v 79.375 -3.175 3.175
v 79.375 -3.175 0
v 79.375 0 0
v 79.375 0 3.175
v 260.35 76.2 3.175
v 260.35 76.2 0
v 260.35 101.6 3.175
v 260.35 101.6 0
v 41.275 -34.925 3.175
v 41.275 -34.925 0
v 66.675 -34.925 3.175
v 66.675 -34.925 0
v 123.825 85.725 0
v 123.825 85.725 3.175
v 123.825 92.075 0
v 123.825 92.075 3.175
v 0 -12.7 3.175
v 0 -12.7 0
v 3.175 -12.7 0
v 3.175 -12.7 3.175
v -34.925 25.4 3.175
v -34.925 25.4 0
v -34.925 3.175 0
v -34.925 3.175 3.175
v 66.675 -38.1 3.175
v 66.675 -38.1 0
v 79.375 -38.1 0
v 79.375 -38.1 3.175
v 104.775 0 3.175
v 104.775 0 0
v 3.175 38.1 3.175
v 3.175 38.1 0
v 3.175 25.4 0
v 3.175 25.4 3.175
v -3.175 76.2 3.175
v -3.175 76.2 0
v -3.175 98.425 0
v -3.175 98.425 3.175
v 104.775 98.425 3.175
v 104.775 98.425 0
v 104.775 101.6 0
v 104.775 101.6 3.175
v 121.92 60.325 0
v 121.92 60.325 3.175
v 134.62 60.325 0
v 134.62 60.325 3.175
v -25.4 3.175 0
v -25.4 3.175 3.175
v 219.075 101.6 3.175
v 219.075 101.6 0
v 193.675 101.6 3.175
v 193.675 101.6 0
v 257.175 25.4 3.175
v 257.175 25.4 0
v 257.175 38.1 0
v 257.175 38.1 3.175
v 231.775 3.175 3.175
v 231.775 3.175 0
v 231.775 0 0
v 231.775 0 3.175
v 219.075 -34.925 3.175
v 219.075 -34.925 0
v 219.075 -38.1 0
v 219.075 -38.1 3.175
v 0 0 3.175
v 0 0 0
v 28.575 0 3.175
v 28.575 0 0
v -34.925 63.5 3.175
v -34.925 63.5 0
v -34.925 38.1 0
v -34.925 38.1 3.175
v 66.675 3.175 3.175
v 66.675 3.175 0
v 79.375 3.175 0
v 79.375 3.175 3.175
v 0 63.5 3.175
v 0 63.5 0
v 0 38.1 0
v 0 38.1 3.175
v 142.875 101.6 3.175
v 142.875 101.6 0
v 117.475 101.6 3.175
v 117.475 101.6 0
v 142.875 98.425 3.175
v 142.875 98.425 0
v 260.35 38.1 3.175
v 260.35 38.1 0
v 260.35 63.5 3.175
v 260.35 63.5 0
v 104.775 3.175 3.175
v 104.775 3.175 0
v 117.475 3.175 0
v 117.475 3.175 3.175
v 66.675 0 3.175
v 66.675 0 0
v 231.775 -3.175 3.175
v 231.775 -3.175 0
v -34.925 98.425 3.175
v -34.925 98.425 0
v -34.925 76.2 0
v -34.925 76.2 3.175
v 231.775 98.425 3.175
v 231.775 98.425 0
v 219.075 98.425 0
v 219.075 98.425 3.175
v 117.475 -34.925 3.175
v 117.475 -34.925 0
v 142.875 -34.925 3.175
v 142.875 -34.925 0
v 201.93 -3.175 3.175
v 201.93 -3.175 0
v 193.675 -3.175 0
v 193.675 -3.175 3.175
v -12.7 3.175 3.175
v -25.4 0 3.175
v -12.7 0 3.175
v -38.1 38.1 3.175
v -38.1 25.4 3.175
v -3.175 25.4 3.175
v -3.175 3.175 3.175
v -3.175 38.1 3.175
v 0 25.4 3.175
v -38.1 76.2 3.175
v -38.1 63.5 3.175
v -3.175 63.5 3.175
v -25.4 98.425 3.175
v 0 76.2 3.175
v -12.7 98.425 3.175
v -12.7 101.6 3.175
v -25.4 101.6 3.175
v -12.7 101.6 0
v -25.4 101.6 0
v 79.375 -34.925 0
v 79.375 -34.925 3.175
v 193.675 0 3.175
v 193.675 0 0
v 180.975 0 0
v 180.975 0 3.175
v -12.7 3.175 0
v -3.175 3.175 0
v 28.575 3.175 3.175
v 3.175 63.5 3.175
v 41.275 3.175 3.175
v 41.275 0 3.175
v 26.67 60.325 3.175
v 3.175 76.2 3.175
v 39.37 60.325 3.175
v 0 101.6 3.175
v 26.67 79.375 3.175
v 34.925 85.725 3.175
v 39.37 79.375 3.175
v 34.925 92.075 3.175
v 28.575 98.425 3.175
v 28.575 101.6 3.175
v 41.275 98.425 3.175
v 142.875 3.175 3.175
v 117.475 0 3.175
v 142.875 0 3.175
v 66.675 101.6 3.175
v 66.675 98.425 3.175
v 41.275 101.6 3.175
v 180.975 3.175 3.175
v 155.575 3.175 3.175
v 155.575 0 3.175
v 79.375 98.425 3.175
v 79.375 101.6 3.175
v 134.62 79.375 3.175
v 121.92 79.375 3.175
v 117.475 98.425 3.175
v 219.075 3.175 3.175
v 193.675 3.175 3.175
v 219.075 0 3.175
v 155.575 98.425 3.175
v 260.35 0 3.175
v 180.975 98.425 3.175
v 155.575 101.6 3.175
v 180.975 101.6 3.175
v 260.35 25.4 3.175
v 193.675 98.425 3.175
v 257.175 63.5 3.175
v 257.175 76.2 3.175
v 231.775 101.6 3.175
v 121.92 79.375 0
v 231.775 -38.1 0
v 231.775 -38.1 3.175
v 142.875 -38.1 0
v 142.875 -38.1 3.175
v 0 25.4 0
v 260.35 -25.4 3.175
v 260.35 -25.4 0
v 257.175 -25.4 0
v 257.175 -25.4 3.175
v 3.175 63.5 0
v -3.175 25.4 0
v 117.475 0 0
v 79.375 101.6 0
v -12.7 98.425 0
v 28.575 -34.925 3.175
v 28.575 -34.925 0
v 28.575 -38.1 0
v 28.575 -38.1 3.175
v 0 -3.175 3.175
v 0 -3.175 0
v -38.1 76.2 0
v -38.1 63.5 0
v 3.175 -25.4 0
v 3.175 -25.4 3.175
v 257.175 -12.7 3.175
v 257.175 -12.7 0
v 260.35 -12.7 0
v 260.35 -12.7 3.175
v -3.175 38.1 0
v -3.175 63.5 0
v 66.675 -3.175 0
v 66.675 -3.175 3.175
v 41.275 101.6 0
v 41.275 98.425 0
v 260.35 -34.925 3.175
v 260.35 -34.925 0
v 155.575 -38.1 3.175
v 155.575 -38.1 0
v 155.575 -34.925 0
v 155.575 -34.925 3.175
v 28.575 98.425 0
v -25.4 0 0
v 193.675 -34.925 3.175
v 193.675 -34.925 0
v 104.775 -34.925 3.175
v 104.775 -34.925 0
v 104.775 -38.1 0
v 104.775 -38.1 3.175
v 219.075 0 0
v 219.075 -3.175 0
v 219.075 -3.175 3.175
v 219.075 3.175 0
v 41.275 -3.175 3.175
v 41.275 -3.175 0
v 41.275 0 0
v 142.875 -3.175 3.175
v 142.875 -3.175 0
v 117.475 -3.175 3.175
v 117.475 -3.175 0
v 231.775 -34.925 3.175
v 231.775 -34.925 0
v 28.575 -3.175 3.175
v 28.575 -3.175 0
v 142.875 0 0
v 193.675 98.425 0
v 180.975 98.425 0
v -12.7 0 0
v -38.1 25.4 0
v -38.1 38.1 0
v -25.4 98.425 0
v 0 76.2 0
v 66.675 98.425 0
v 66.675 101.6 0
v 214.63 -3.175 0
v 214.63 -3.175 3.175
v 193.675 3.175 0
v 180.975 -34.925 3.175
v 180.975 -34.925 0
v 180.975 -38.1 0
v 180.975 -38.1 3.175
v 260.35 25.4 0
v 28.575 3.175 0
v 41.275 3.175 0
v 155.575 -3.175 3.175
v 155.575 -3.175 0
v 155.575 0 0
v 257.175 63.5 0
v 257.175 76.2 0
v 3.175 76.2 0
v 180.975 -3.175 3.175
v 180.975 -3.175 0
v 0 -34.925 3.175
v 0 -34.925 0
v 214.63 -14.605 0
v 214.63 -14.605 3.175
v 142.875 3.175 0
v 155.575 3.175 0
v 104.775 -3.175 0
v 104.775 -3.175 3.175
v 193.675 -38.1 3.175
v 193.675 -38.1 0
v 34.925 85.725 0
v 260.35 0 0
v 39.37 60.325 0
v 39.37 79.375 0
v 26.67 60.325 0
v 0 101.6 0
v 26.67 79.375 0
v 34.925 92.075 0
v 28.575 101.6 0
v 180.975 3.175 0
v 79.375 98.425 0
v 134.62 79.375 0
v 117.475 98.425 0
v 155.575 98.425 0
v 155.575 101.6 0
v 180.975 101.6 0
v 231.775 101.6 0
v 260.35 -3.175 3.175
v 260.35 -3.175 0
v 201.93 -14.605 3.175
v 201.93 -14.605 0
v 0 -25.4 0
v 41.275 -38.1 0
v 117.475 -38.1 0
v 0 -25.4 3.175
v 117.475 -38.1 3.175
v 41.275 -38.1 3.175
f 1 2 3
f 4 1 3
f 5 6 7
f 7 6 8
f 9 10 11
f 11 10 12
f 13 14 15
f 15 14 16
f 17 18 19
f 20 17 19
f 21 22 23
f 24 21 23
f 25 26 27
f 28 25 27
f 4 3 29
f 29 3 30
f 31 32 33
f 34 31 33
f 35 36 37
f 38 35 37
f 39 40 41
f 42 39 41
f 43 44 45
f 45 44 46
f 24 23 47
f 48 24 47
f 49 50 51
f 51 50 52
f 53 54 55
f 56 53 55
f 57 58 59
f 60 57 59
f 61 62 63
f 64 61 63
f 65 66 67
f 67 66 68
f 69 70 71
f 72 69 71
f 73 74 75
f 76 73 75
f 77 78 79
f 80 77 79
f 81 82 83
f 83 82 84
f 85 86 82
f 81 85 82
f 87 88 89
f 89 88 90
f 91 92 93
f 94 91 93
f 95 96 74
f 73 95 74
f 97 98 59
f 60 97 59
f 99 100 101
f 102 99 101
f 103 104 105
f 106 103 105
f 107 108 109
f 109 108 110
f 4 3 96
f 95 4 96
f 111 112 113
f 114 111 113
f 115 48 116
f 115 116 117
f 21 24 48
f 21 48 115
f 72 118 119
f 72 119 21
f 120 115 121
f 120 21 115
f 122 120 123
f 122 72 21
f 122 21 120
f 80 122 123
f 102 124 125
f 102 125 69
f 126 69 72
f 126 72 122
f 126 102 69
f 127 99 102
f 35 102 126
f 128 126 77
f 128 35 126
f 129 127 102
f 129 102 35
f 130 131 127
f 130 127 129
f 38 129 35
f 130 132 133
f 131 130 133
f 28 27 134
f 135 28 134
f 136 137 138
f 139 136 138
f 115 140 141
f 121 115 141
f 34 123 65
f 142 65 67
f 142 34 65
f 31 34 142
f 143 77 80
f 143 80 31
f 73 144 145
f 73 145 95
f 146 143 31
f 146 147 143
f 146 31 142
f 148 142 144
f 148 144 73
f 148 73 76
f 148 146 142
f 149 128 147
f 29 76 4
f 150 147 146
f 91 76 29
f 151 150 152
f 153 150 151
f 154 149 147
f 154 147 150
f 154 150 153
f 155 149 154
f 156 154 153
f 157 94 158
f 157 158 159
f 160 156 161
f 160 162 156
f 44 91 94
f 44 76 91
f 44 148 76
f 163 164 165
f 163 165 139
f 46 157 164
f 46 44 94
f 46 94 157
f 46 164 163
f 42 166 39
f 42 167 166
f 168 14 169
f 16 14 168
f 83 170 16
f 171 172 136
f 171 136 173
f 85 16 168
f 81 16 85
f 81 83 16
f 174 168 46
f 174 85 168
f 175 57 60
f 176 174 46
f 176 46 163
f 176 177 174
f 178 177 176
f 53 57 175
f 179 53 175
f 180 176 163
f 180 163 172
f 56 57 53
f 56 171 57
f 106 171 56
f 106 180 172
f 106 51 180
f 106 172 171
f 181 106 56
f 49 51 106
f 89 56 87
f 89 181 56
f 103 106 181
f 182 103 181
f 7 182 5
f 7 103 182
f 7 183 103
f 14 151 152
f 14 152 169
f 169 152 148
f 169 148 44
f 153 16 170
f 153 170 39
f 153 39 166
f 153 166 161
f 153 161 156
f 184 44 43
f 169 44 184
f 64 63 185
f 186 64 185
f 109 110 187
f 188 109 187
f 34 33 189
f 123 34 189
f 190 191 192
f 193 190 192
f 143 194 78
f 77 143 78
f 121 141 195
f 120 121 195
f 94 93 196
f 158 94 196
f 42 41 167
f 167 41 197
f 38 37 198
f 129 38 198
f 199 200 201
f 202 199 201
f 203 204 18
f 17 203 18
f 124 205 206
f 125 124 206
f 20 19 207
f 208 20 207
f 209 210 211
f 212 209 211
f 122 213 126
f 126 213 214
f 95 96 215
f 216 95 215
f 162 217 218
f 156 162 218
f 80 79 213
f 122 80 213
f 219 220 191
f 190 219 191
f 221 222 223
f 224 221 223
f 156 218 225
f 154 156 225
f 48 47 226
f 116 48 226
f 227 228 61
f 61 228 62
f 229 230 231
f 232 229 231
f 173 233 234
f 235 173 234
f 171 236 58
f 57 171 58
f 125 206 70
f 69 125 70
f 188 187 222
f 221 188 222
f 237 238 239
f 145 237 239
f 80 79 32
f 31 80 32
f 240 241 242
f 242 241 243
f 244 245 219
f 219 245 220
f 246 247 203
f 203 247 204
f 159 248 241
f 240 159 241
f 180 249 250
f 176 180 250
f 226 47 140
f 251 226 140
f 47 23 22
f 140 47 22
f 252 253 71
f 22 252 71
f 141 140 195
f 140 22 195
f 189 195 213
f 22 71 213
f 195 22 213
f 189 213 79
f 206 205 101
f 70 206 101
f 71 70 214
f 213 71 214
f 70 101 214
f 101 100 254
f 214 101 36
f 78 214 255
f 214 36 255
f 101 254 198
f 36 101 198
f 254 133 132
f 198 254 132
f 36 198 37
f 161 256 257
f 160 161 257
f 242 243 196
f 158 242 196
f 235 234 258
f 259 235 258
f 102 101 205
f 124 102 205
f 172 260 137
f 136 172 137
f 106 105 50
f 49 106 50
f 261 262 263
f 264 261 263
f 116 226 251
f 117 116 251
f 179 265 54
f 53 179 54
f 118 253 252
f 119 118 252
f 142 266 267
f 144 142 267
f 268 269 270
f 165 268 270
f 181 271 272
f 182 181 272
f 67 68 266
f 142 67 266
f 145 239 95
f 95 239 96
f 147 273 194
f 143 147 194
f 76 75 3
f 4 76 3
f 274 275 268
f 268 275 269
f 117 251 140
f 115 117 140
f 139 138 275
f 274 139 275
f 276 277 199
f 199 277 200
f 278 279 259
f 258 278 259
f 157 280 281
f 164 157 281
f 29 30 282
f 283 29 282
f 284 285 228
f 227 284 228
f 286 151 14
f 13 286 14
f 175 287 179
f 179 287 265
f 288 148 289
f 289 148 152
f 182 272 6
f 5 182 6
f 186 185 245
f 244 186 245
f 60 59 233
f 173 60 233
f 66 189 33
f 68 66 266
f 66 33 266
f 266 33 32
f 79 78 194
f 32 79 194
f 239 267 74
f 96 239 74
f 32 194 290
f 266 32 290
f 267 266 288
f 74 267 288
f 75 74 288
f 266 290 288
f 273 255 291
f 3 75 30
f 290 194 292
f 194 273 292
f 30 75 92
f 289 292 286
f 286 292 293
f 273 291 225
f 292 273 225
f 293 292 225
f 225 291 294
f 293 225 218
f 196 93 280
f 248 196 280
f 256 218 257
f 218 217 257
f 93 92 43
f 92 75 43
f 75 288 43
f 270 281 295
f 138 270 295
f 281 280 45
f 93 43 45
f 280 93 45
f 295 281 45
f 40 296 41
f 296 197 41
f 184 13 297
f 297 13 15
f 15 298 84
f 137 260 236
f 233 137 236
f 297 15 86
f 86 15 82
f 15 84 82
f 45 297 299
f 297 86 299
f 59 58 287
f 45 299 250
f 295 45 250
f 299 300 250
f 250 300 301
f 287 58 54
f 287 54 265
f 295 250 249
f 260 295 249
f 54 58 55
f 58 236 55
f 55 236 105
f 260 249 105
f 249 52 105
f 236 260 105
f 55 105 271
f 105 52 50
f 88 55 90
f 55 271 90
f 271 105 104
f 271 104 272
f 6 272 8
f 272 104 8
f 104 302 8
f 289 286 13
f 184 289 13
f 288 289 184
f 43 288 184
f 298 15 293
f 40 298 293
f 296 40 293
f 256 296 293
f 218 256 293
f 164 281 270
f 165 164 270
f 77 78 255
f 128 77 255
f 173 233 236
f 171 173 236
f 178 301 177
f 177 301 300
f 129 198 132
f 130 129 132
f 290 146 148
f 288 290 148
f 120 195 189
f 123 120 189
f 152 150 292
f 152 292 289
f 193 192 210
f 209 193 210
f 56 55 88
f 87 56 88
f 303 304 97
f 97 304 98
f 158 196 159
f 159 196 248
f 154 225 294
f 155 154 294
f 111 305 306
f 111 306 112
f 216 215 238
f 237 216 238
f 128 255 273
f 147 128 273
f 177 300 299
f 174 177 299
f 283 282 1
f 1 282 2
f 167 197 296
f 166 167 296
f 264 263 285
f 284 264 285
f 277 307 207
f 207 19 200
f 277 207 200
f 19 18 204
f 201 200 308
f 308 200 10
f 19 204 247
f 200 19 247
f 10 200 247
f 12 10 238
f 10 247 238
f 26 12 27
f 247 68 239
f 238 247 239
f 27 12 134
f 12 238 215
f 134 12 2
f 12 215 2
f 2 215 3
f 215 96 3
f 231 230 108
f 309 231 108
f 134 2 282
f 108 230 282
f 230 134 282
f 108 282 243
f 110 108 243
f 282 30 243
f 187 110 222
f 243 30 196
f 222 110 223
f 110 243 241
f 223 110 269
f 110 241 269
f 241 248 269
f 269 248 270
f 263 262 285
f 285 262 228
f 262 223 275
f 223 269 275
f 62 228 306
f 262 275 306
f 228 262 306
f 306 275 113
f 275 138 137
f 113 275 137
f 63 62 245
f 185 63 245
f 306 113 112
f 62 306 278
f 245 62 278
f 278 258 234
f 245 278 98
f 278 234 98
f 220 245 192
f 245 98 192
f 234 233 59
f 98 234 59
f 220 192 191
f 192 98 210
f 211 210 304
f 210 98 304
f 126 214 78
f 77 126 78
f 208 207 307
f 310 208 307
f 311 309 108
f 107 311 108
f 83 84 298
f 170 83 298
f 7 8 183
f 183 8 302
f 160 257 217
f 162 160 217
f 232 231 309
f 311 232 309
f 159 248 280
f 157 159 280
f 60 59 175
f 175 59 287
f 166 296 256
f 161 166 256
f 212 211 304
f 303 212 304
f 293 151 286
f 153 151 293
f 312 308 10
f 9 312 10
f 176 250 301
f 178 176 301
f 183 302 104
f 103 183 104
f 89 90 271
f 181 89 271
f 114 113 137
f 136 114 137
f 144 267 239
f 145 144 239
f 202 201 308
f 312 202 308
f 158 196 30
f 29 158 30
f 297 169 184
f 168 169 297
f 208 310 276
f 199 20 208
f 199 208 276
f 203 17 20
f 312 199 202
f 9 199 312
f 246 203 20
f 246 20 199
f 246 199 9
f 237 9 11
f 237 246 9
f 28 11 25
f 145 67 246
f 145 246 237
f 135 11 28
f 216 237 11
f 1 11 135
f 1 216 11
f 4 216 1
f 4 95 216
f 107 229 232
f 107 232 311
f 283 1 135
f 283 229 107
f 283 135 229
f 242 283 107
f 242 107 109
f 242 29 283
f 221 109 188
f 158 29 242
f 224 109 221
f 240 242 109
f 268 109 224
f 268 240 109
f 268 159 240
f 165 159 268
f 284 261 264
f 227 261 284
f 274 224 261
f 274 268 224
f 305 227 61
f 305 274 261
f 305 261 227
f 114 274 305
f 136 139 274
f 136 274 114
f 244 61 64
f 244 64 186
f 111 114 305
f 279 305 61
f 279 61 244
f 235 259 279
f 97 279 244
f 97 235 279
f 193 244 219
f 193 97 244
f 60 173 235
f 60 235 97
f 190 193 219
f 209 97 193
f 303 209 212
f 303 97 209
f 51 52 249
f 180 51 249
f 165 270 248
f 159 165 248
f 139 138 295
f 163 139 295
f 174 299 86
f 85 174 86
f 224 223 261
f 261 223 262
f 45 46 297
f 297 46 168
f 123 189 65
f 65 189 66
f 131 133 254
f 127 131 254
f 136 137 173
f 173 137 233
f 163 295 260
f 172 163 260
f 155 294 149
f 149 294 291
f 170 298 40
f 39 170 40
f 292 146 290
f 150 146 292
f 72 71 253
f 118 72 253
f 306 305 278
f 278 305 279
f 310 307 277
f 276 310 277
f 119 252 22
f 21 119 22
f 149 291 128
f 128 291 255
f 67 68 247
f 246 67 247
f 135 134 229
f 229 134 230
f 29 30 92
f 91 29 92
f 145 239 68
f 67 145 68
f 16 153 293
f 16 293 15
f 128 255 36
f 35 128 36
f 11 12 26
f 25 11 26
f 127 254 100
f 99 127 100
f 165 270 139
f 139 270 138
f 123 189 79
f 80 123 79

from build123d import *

# Parameters (mm, degrees)
F1_DEPTH = 3.175
F3_DEPTH = 3.175
F5_DEPTH = 3.175
F6_W     = 12.7
F6_H     = 19.05
F6_W_2   = 88.9
F6_H_2   = 6.35
F6_H_3   = 11.43
F7_DEPTH = 3.176


with BuildPart() as f1:
    # F0 (on Top) → F1 (new body)
    with BuildSketch(Plane.XY):
        Polygon((0, 25.4), (0, 0), (28.575, 0), (28.575, 3.175), (41.275, 3.175), (41.275, 0), (66.675, 0), (66.675, 3.175), (79.375, 3.175), (79.375, 0), (104.775, 0), (104.775, 3.175), (117.475, 3.175), (117.475, 0), (142.875, 0), (142.875, 3.175), (155.575, 3.175), (155.575, 0), (180.975, 0), (180.975, 3.175), (193.675, 3.175), (193.675, 0), (219.075, 0), (219.075, 3.175), (231.775, 3.175), (231.775, 0), (260.35, 0), (260.35, 25.4), (257.175, 25.4), (257.175, 38.1), (260.35, 38.1), (260.35, 63.5), (257.175, 63.5), (257.175, 76.2), (260.35, 76.2), (260.35, 101.6), (231.775, 101.6), (231.775, 98.425), (219.075, 98.425), (219.075, 101.6), (193.675, 101.6), (193.675, 98.425), (180.975, 98.425), (180.975, 101.6), (155.575, 101.6), (155.575, 98.425), (142.875, 98.425), (142.875, 101.6), (117.475, 101.6), (117.475, 98.425), (104.775, 98.425), (104.775, 101.6), (79.375, 101.6), (79.375, 98.425), (66.675, 98.425), (66.675, 101.6), (41.275, 101.6), (41.275, 98.425), (28.575, 98.425), (28.575, 101.6), (0, 101.6), (0, 76.2), (3.175, 76.2), (3.175, 63.5), (0, 63.5), (0, 38.1), (3.175, 38.1), (3.175, 25.4), align=None)
    extrude(amount=F1_DEPTH)


with BuildPart() as f3:
    # F2 (on Top) → F3 (new body)
    with BuildSketch(Plane.XY):
        Polygon((41.275, 0), (28.575, 0), (28.575, -3.175), (0, -3.175), (0, -12.7), (3.175, -12.7), (3.175, -25.4), (0, -25.4), (0, -34.925), (28.575, -34.925), (28.575, -38.1), (41.275, -38.1), (41.275, -34.925), (66.675, -34.925), (66.675, -38.1), (79.375, -38.1), (79.375, -34.925), (104.775, -34.925), (104.775, -38.1), (117.475, -38.1), (117.475, -34.925), (142.875, -34.925), (142.875, -38.1), (155.575, -38.1), (155.575, -34.925), (180.975, -34.925), (180.975, -38.1), (193.675, -38.1), (193.675, -34.925), (219.075, -34.925), (219.075, -38.1), (231.775, -38.1), (231.775, -34.925), (260.35, -34.925), (260.35, -25.4), (257.175, -25.4), (257.175, -12.7), (260.35, -12.7), (260.35, -3.175), (231.775, -3.175), (231.775, 0), (219.075, 0), (219.075, -3.175), (193.675, -3.175), (193.675, 0), (180.975, 0), (180.975, -3.175), (155.575, -3.175), (155.575, 0), (142.875, 0), (142.875, -3.175), (117.475, -3.175), (117.475, 0), (104.775, 0), (104.775, -3.175), (79.375, -3.175), (79.375, 0), (66.675, 0), (66.675, -3.175), (41.275, -3.175), align=None)
    extrude(amount=F3_DEPTH)


with BuildPart() as f5:
    # F4 (on Top) → F5 (new body)
    with BuildSketch(Plane.XY):
        Polygon((-3.175, 25.4), (0, 25.4), (0, 38.1), (-3.175, 38.1), (-3.175, 63.5), (0, 63.5), (0, 76.2), (-3.175, 76.2), (-3.175, 98.425), (-12.7, 98.425), (-12.7, 101.6), (-25.4, 101.6), (-25.4, 98.425), (-34.925, 98.425), (-34.925, 76.2), (-38.1, 76.2), (-38.1, 63.5), (-34.925, 63.5), (-34.925, 38.1), (-38.1, 38.1), (-38.1, 25.4), (-34.925, 25.4), (-34.925, 3.175), (-25.4, 3.175), (-25.4, 0), (-12.7, 0), (-12.7, 3.175), (-3.175, 3.175), align=None)
    extrude(amount=F5_DEPTH)


with BuildPart() as f7_tool:
    # F6 (on face) → F7 (new body, through all)
    with BuildSketch(Plane.XY.offset(3.175)):
        with Locations((33.02, 69.85)):
            Rectangle(F6_W, F6_H)
        with Locations((79.375, 88.9)):
            Rectangle(F6_W_2, F6_H_2)
        with Locations((128.27, 69.85)):
            Rectangle(F6_W, F6_H)
        with Locations((208.28, -8.89)):
            Rectangle(F6_W, F6_H_3)
    extrude(amount=-F7_DEPTH)


with BuildPart() as f1_1:
    add(f1.part)

    # F7: cut by f7_tool
    add(f7_tool.part, mode=Mode.SUBTRACT)


with BuildPart() as f3_1:
    add(f3.part)

    # F7: cut by f7_tool
    add(f7_tool.part, mode=Mode.SUBTRACT)


solid = Compound([f5.part, f1_1.part, f3_1.part])
